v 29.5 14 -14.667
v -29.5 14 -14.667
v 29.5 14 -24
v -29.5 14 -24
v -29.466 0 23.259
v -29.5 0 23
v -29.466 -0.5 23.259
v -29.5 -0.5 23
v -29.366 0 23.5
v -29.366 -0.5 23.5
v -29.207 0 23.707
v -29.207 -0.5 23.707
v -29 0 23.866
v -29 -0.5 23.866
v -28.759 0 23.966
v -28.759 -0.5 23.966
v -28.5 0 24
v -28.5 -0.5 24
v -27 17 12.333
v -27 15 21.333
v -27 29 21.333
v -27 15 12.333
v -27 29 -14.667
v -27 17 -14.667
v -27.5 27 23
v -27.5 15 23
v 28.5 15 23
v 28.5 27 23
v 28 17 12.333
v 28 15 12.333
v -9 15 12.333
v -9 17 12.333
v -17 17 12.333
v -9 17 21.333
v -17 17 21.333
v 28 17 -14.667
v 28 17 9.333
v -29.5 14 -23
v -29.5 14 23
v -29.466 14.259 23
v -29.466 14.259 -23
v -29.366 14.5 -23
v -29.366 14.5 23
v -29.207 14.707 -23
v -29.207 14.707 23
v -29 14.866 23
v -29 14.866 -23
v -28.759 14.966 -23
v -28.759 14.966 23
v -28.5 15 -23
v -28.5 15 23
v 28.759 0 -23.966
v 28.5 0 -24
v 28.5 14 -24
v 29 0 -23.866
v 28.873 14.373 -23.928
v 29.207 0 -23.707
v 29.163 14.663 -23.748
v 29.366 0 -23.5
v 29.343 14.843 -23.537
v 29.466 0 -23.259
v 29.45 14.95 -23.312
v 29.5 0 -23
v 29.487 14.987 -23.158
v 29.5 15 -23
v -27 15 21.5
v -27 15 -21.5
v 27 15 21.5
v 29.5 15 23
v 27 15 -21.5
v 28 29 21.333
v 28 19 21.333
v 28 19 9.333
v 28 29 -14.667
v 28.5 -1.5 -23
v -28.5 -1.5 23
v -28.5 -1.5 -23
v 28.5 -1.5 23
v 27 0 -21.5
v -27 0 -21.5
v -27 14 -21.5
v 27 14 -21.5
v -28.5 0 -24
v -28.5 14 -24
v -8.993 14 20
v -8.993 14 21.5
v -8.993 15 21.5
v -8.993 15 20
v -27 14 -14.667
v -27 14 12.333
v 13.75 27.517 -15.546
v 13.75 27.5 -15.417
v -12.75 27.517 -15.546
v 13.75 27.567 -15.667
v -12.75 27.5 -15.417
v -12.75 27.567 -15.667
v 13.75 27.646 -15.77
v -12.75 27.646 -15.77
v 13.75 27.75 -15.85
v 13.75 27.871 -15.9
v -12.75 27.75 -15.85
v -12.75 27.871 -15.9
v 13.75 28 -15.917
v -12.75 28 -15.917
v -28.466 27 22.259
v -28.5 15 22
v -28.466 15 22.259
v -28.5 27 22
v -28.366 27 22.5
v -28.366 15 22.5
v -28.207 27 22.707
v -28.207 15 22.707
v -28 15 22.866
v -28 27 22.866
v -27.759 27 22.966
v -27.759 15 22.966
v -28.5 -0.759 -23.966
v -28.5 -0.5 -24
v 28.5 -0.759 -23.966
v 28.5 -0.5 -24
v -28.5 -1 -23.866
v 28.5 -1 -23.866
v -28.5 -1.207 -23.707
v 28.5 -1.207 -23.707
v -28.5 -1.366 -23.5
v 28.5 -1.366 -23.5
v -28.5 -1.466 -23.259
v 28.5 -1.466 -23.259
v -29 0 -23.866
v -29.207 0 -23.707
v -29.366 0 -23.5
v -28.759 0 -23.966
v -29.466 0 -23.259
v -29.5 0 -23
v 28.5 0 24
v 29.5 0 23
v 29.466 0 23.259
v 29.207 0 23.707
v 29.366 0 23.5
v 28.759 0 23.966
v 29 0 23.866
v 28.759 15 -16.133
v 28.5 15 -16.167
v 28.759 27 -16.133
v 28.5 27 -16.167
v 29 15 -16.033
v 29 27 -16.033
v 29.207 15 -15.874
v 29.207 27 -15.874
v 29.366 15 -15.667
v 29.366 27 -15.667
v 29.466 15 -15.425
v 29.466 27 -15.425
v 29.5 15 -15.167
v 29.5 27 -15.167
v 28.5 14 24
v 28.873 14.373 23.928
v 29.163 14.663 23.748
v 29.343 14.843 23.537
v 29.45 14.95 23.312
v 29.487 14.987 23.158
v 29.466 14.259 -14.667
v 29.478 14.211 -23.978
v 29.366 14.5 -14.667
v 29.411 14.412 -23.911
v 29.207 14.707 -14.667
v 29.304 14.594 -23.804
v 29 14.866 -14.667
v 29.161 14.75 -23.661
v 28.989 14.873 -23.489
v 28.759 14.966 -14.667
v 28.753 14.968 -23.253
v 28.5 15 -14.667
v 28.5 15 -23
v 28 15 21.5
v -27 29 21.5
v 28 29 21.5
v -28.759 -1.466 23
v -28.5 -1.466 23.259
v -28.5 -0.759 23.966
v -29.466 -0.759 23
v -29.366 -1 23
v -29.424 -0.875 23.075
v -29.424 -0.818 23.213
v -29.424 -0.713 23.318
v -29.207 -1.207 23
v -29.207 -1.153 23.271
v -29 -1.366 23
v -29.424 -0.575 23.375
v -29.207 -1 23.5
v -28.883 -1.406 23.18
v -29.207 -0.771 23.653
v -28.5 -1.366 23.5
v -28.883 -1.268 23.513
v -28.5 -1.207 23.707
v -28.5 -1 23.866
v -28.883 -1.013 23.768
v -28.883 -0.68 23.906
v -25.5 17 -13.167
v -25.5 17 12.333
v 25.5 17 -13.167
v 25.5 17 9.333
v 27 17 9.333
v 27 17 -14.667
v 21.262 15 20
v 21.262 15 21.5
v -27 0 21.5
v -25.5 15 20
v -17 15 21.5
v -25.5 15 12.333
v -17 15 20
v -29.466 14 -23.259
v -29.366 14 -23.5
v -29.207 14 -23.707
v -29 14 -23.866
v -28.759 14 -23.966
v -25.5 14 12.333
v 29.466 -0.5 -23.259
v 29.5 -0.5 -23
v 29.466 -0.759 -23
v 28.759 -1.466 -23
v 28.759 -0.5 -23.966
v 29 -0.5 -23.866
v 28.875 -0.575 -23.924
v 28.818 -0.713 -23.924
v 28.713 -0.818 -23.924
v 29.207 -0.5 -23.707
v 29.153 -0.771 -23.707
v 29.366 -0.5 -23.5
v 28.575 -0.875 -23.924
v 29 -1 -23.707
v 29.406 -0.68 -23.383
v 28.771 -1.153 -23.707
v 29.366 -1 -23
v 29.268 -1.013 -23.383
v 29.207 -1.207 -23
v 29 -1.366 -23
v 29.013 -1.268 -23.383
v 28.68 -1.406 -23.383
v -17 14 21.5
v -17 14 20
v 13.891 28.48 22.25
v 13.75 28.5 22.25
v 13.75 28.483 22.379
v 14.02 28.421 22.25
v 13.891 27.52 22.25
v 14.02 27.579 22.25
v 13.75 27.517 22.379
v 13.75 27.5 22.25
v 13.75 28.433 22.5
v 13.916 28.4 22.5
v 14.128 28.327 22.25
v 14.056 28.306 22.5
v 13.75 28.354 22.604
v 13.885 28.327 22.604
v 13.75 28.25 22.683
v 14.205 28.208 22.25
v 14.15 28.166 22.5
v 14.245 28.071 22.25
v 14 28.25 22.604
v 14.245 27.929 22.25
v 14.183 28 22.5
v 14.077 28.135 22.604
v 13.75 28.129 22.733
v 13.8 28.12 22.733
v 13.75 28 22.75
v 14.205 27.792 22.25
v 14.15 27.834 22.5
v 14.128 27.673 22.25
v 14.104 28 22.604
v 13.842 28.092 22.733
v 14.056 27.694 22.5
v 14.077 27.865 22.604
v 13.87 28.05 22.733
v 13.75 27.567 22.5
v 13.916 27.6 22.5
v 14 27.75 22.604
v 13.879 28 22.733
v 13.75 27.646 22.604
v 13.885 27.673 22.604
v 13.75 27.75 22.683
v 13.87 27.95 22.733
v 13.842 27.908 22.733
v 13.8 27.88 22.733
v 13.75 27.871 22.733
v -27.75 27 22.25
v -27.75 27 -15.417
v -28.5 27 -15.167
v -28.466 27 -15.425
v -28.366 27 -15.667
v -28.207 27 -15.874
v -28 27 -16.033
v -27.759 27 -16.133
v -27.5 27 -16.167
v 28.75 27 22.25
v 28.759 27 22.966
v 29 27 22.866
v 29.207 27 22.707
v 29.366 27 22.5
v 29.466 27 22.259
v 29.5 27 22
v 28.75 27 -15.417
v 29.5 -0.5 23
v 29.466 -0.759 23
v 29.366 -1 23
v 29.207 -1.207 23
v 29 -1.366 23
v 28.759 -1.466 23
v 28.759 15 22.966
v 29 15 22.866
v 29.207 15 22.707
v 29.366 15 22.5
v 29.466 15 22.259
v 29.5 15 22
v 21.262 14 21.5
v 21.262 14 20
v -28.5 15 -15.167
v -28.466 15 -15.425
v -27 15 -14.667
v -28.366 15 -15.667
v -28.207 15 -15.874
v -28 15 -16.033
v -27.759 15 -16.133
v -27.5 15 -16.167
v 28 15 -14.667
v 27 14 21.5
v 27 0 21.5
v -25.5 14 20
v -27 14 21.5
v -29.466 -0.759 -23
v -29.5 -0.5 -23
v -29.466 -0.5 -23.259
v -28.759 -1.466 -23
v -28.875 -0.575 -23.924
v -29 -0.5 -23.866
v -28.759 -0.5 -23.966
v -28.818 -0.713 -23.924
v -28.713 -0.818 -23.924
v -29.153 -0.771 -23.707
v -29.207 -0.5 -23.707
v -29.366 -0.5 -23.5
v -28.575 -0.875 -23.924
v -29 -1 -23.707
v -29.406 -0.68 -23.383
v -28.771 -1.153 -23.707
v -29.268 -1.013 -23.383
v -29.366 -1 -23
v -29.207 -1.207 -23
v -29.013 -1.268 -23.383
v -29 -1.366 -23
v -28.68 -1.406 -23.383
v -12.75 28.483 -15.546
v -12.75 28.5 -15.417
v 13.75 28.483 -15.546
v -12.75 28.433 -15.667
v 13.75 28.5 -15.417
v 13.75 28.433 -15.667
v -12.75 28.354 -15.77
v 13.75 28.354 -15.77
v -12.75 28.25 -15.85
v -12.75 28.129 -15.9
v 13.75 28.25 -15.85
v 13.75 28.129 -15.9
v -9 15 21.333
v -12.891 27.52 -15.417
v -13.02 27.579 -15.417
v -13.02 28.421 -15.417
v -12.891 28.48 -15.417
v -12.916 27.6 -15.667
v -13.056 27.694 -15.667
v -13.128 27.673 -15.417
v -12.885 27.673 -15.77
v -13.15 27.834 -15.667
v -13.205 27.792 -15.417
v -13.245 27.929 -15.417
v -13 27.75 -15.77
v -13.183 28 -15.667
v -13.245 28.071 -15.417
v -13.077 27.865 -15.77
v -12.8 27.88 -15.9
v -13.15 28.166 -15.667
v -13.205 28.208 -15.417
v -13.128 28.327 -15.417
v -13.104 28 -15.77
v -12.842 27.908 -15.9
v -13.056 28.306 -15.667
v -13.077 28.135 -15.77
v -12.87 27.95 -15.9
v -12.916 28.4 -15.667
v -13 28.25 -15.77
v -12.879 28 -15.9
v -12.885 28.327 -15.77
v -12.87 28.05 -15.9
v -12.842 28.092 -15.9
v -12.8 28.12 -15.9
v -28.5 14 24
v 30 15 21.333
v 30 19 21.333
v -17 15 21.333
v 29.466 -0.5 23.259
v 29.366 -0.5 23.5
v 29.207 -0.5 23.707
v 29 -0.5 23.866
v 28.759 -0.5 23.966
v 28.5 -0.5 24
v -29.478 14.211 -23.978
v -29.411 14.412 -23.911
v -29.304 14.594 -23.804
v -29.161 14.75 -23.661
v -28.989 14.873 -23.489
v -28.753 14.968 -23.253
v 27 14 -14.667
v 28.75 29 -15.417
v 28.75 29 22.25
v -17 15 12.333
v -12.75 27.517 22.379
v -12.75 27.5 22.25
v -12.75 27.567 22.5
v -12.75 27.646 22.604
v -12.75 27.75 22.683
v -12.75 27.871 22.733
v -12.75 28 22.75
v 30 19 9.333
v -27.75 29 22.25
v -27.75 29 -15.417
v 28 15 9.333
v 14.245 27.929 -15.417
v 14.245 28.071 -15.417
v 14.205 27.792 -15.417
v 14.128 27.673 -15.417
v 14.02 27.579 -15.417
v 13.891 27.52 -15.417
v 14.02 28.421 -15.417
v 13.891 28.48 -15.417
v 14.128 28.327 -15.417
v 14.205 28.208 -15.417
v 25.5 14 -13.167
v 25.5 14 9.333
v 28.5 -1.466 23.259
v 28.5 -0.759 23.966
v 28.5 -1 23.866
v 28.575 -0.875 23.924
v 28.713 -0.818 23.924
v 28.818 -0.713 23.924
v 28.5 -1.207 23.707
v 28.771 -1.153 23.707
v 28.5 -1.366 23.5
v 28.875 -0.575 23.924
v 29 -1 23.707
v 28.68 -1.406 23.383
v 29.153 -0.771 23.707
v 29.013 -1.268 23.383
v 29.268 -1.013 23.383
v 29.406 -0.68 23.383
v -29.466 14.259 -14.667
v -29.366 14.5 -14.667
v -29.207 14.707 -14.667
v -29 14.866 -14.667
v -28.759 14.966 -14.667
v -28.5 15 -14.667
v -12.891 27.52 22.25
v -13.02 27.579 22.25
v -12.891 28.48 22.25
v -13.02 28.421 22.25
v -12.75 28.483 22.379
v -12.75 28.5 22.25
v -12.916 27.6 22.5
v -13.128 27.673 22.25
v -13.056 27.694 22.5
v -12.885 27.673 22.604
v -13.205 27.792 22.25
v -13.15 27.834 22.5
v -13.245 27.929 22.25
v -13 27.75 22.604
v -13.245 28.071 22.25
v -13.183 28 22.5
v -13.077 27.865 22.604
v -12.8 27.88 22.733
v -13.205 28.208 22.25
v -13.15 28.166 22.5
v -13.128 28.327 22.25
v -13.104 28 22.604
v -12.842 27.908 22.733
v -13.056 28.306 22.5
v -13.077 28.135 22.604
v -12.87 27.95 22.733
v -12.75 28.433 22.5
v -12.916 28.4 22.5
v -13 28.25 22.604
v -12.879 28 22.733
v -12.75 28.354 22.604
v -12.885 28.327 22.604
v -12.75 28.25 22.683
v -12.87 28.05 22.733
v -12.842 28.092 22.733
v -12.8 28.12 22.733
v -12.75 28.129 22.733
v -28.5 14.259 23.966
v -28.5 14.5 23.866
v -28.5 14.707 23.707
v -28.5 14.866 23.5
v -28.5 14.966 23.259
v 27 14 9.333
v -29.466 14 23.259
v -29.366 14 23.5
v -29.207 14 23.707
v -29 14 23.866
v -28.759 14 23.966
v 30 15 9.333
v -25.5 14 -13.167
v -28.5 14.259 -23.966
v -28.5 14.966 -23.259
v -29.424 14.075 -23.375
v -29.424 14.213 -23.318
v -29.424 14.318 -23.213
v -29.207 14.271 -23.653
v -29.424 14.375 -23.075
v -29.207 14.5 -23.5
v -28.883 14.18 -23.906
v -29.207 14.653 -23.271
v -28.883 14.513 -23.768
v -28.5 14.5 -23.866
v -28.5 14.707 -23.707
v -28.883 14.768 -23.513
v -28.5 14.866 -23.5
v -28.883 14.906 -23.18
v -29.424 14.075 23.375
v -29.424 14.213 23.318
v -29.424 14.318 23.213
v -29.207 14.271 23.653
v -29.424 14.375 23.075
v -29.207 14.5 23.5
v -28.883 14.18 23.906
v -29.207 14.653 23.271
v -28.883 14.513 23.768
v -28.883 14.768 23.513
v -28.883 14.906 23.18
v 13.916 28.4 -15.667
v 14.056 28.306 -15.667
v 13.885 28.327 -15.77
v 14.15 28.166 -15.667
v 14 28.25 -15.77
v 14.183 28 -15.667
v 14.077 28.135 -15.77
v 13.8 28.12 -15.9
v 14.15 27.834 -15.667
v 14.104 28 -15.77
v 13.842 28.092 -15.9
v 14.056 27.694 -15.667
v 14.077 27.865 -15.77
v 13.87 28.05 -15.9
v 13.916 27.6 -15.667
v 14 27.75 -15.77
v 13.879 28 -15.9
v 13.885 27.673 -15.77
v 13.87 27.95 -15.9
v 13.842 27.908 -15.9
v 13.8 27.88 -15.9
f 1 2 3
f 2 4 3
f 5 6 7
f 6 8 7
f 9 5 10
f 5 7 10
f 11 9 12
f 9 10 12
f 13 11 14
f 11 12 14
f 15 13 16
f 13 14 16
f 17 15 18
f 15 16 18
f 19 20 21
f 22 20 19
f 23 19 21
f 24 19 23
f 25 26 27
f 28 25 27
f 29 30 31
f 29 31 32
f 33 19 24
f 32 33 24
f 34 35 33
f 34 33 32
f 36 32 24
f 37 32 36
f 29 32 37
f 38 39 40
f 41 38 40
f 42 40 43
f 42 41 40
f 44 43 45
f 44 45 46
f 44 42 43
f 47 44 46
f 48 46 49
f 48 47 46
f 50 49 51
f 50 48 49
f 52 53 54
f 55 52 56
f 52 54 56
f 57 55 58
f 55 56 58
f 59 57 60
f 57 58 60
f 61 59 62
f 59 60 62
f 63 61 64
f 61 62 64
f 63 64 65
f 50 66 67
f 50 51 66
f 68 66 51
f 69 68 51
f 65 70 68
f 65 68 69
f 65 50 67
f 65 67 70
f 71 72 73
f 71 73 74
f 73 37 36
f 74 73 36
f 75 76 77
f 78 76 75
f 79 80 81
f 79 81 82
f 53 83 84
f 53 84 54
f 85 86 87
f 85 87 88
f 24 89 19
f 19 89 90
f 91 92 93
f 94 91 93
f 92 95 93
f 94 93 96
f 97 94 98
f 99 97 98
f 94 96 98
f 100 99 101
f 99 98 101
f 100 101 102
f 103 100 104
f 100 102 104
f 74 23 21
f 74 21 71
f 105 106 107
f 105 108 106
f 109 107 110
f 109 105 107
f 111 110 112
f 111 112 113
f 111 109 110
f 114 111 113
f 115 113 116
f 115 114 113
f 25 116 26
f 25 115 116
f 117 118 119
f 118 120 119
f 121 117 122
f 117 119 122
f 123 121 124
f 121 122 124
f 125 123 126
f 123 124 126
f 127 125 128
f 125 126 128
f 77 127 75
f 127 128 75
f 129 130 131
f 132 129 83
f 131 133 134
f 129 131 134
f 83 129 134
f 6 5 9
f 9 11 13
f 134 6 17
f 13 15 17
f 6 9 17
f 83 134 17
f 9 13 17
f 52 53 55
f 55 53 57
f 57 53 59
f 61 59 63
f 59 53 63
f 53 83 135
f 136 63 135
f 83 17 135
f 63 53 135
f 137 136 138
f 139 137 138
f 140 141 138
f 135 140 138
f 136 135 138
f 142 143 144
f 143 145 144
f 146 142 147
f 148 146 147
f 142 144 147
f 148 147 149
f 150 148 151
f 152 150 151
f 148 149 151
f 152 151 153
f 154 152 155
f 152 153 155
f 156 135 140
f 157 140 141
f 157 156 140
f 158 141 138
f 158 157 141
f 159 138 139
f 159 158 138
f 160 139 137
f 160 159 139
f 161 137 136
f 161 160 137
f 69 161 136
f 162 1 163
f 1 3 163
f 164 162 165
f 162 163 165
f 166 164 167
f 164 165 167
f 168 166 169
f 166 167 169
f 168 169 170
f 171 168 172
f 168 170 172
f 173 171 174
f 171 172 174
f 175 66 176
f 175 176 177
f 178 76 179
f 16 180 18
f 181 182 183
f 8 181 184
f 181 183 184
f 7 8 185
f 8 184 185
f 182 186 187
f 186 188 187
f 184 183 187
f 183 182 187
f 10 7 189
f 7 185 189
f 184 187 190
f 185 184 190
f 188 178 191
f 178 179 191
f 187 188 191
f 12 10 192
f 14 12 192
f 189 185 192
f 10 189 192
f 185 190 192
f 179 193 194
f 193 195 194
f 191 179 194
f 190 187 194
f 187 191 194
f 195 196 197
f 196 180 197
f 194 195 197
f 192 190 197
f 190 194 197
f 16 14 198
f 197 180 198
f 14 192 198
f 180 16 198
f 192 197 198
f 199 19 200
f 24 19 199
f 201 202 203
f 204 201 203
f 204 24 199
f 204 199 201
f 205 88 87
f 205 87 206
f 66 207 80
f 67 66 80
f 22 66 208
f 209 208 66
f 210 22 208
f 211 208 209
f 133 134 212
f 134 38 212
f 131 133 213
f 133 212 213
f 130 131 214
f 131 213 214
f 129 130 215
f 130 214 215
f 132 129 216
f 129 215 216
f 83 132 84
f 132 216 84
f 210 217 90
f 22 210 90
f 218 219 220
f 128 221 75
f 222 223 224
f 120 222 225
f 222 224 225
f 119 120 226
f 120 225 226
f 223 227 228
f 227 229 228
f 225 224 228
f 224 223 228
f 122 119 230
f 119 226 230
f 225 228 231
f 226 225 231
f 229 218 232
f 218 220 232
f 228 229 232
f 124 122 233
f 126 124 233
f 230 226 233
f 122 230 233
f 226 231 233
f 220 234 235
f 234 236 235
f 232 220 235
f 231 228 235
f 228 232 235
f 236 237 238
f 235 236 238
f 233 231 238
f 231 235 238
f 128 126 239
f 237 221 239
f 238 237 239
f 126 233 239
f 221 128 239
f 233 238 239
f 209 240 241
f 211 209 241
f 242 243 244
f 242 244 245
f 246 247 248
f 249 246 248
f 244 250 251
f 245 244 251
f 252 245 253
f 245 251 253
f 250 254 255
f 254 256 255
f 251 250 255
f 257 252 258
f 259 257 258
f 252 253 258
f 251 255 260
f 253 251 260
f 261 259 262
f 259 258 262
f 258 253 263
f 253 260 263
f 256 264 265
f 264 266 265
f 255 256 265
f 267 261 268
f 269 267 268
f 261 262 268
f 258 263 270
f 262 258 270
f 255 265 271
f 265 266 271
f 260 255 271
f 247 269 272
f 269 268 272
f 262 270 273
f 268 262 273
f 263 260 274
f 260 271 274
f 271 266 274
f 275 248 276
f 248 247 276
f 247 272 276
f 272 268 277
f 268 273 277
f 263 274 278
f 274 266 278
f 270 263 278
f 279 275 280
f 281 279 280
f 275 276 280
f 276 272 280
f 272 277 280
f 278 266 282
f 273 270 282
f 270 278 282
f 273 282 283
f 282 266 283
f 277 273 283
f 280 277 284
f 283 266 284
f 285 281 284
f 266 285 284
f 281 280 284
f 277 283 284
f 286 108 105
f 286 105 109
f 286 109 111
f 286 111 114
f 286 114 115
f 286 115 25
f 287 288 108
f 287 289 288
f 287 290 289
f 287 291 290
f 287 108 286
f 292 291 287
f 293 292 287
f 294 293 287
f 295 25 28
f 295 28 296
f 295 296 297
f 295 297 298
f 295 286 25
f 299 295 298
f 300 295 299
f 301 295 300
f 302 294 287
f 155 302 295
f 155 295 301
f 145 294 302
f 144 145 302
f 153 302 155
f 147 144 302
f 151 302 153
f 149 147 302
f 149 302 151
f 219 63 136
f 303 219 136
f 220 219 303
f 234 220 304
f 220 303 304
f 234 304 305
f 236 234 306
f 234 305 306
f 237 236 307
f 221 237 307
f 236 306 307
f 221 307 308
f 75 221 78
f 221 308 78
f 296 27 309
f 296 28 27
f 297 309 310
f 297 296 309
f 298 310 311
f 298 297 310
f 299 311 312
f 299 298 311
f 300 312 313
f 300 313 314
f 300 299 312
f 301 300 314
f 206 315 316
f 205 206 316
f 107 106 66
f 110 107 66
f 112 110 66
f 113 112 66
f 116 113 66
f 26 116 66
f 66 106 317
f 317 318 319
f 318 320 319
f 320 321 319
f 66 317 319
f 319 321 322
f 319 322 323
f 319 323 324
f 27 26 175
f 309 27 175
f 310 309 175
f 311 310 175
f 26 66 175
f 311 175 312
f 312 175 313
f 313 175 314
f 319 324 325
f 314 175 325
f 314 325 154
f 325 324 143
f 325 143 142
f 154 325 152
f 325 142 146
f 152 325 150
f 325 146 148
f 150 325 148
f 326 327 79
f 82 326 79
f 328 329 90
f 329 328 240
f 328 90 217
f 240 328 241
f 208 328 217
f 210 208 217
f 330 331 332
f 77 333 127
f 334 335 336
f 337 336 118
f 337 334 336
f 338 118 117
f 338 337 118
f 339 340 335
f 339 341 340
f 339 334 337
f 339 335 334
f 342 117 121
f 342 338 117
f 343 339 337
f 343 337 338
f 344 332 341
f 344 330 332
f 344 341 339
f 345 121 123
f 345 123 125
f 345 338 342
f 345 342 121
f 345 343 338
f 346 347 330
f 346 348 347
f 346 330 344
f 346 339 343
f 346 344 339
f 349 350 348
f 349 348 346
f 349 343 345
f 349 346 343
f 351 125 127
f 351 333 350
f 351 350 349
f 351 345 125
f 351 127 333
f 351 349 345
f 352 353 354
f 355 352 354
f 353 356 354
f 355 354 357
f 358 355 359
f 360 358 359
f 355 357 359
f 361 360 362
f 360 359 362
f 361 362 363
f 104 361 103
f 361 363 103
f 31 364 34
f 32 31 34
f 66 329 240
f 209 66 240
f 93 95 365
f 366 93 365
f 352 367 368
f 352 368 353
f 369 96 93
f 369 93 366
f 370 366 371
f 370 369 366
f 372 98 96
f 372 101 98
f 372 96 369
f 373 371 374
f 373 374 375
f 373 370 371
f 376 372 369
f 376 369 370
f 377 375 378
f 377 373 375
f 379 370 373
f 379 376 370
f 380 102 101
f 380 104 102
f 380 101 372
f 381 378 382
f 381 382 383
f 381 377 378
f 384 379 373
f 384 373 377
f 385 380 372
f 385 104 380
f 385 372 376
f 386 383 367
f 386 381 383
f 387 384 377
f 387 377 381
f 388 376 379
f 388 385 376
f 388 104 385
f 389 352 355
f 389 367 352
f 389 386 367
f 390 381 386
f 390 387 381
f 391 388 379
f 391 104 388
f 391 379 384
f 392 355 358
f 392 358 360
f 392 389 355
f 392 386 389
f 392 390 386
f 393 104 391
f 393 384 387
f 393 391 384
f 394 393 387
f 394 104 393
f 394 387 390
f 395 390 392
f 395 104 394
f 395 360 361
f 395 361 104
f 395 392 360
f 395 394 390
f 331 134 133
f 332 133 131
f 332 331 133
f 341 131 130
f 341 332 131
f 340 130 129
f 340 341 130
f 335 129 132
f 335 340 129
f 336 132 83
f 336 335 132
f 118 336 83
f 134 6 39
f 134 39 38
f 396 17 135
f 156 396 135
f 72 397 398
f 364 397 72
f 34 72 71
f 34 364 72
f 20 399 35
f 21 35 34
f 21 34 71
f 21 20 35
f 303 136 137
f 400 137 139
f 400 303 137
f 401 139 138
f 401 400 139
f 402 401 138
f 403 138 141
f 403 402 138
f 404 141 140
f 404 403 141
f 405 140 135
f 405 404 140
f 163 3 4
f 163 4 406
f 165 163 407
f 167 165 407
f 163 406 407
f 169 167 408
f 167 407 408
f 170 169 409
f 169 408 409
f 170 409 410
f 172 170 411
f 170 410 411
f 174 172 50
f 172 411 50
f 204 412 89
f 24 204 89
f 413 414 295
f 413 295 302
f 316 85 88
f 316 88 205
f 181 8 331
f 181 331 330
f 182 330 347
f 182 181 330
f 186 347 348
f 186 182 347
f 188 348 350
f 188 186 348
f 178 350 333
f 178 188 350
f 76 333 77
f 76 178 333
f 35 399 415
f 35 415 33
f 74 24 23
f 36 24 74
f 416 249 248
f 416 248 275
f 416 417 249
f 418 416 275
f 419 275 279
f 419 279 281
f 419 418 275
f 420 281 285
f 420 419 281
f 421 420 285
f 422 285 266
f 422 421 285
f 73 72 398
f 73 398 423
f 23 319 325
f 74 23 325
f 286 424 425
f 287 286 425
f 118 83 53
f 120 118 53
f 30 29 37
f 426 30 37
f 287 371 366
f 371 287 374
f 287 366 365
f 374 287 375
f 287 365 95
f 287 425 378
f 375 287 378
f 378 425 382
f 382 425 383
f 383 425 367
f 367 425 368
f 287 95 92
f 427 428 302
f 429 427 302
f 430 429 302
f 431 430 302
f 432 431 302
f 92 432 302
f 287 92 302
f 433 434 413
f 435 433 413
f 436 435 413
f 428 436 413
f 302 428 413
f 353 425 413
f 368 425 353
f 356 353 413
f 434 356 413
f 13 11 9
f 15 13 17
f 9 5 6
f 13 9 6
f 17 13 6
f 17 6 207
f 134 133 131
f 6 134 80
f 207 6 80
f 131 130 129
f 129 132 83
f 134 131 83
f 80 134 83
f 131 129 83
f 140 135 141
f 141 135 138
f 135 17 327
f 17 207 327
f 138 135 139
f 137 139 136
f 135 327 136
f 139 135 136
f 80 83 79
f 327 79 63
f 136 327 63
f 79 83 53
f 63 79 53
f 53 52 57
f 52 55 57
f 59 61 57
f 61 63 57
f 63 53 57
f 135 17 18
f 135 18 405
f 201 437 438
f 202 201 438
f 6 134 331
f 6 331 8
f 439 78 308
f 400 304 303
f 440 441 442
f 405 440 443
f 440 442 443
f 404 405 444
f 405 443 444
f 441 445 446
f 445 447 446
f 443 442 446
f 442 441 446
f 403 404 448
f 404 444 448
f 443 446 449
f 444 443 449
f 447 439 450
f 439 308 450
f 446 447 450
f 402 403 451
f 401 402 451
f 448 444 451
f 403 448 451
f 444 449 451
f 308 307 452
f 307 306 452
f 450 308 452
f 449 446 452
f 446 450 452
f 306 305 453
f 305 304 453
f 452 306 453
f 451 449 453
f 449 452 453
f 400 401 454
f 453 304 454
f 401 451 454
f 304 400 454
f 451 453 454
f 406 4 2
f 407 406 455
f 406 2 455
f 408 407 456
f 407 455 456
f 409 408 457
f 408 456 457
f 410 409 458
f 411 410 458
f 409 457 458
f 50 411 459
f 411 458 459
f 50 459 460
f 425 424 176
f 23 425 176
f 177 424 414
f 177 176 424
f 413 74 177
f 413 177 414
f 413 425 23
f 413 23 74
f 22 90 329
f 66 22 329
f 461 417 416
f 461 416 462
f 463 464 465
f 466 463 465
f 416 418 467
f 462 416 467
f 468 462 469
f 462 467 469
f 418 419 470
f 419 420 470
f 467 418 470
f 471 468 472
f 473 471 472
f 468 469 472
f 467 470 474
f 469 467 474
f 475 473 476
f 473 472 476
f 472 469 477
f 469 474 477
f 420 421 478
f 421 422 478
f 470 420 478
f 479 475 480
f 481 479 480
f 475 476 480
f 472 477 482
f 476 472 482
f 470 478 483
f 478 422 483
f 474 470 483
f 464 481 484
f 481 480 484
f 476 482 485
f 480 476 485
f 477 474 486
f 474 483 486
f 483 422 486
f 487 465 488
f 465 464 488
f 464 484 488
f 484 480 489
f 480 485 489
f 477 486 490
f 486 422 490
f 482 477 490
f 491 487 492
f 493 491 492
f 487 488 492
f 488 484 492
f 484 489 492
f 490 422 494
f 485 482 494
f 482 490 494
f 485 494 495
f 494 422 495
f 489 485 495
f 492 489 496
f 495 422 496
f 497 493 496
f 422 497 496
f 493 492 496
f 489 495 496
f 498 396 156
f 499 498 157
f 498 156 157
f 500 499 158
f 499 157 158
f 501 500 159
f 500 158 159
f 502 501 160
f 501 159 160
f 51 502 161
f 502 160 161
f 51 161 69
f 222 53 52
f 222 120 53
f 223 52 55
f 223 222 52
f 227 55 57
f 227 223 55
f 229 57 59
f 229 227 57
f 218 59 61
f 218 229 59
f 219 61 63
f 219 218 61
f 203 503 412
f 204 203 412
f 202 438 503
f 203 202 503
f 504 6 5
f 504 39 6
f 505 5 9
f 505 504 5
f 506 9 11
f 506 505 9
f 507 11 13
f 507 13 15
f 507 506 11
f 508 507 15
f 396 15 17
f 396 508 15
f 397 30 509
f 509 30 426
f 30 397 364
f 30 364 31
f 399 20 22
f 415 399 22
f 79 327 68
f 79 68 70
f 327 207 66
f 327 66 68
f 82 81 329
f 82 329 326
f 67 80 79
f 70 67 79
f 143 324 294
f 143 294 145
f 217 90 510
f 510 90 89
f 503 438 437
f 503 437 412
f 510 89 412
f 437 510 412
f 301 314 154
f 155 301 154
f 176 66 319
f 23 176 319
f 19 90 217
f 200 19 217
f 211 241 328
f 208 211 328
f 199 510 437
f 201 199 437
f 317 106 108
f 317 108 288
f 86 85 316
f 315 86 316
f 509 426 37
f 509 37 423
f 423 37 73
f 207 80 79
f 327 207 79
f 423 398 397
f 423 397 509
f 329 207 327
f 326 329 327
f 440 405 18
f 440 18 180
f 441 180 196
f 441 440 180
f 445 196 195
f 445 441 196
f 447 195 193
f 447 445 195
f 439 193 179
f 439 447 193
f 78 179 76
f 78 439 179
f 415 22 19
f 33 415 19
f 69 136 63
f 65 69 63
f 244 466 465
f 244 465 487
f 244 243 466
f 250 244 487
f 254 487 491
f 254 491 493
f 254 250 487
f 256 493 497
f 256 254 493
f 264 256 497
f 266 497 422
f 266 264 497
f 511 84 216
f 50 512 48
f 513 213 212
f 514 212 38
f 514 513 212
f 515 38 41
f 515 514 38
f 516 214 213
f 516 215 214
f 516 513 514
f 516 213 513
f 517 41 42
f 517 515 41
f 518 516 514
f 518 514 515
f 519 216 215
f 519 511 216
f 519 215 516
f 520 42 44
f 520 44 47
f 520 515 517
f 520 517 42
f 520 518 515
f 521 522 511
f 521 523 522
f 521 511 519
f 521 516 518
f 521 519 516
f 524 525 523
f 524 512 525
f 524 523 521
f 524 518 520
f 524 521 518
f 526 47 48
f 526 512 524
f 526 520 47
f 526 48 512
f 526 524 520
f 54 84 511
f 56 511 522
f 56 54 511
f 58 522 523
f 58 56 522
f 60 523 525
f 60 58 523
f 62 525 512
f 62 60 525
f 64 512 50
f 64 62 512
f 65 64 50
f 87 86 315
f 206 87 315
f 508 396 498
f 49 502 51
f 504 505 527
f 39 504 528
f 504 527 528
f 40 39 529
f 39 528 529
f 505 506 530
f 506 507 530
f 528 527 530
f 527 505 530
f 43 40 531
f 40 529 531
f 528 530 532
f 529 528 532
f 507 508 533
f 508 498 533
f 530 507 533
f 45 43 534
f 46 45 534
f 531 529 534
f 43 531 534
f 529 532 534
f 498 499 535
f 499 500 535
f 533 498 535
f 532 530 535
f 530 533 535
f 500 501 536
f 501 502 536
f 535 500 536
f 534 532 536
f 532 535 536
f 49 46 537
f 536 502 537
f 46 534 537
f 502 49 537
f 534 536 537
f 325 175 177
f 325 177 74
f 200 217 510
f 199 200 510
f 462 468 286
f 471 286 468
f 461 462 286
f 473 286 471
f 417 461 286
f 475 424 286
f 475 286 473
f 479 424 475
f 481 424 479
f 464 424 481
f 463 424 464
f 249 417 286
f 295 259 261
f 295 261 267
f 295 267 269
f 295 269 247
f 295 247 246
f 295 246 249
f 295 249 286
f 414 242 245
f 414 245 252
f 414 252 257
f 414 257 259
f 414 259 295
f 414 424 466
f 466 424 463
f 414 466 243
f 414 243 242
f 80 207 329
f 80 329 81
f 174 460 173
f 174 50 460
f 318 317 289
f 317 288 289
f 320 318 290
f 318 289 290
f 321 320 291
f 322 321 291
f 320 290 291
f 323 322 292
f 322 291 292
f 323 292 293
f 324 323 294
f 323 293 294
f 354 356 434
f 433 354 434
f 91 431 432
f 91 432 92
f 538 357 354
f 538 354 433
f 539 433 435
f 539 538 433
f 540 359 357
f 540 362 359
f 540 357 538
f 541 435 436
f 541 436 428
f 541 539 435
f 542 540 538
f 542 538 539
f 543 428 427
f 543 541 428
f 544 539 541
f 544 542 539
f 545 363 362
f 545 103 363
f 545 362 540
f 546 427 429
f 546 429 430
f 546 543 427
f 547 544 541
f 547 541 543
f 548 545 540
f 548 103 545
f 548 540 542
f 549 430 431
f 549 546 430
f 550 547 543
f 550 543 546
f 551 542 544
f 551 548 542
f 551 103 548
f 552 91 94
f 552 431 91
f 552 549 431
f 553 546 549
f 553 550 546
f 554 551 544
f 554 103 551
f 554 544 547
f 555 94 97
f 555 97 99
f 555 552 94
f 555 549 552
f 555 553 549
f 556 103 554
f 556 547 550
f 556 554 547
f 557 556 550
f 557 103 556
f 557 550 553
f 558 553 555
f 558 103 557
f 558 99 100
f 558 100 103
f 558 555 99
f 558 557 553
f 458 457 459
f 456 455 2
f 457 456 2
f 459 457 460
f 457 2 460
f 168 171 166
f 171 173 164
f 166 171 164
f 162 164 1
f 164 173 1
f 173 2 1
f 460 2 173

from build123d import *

# Parameters (mm, degrees)
SKETCH2_W                        = 54
SKETCH2_H                        = 43
BOSS_EXTRUDE1_BATTERY_DEPTH      = 14
SKETCH4_W                        = 55
SKETCH4_H                        = 36
BOSS_EXTRUDE2_CIRCUIT_DEPTH      = 14
SKETCH11_W                       = 27
SKETCH11_H                       = 2
CUT_EXTRUDE2_CUTPINS_DEPTH       = 55
SKETCH12_W                       = 12
SKETCH12_H                       = 4
BOSS_EXTRUDE1_BATTERYCON_DEPTH   = 2
SKETCH8_W                        = 8
SKETCH8_H                        = 2
CUT_EXTRUDE3_SWITCHCONNGAP_DEPTH = 10
SKETCH13_W                       = 59
SKETCH13_H                       = 48
SKETCH13_W_2                     = 54
SKETCH13_H_2                     = 43
BOSS_EXTRUDE4_DEPTH              = 15
BOSS_EXTRUDE6_DEPTH              = 3
BOSS_EXTRUDE7_DEPTH              = 1
SKETCH14_6_W                     = 30.255010682
SKETCH14_6_H                     = 1.5
BOSS_EXTRUDE7_2_DEPTH            = 1
BOSS_EXTRUDE9_DEPTH              = 1
SKETCH15_W                       = 58
SKETCH15_H                       = 39.166666667
SKETCH15_W_2                     = 55
SKETCH15_H_2                     = 36.166666667
BOSS_EXTRUDE10_DEPTH             = 14
SKETCH16_W                       = 58
SKETCH16_H                       = 39.166666667
SKETCH16_W_2                     = 56.5
SKETCH16_H_2                     = 37.666666667
CUT_EXTRUDE_LIDCUT_DEPTH         = 2
BOSS_EXTRUDE11_DEPTH             = 0.5
FILLET5_R                        = 0.5
FILLET5_OF_MIRROR1_R             = 0.5
SKETCH18_W                       = 59
SKETCH18_H                       = 48
BOSS_EXTRUDE13_DEPTH             = 1.5
FILLET6_R                        = 1
FILLET7_R                        = 1
FILLET8_R                        = 1
FILLET9_R                        = 1


with BuildPart() as part:
    # Sketch2 → Boss-Extrude1-Battery (new body)
    with BuildSketch(Plane(origin=(0, 0, 0), x_dir=(1, 0, 0), z_dir=(0, 1, 0))):
        Rectangle(SKETCH2_W, SKETCH2_H)
    extrude(amount=BOSS_EXTRUDE1_BATTERY_DEPTH)


with BuildPart() as body_2:
    # Sketch4 → Boss-Extrude2-Circuit (new body)
    with BuildSketch(Plane(origin=(0, 15, 0), x_dir=(1, 0, 0), z_dir=(0, 1, 0))):
        with Locations((0.5, -3.333333333)):
            Rectangle(SKETCH4_W, SKETCH4_H)
    extrude(amount=BOSS_EXTRUDE2_CIRCUIT_DEPTH)

    # Sketch11 → Cut-Extrude2-CutPins (cut)
    with BuildSketch(Plane(origin=(28, 0, 0), x_dir=(0, 0, -1), z_dir=(1, 0, 0))):
        with Locations((1.166666667, 16)):
            Rectangle(SKETCH11_W, SKETCH11_H)
    extrude(amount=-CUT_EXTRUDE2_CUTPINS_DEPTH, mode=Mode.SUBTRACT)

    # Sketch12 → Boss-Extrude1-BatteryCon (add)
    with BuildSketch(Plane(origin=(28, 0, 0), x_dir=(0, 0, -1), z_dir=(1, 0, 0))):
        with Locations((-15.333333333, 17)):
            Rectangle(SKETCH12_W, SKETCH12_H)
    extrude(amount=BOSS_EXTRUDE1_BATTERYCON_DEPTH)

    # Sketch8 → Cut-Extrude3-SwitchConnGap (cut)
    with BuildSketch(Plane.XY.offset(21.333333333)):
        with Locations((-13, 16)):
            Rectangle(SKETCH8_W, SKETCH8_H)
    extrude(amount=-CUT_EXTRUDE3_SWITCHCONNGAP_DEPTH, mode=Mode.SUBTRACT)


with BuildPart() as body_3:
    # Sketch13 → Boss-Extrude4 (new body)
    with BuildSketch(Plane(origin=(0, 0, 0), x_dir=(1, 0, 0), z_dir=(0, 1, 0))):
        Rectangle(SKETCH13_W, SKETCH13_H)
        Rectangle(SKETCH13_W_2, SKETCH13_H_2, mode=Mode.SUBTRACT)
    extrude(amount=BOSS_EXTRUDE4_DEPTH)

    # Fillet6
    fillet6_edges = [body_3.edges().sort_by_distance(p)[0] for p in [
        (0, 15, 24),
        (0, 15, -24),
        (29.5, 7.5, -24),
        (29.5, 7.5, 24),
        (-29.5, 7.5, 24),
        (-29.5, 7.5, -24),
        (-29.5, 15, 0),
    ]]
    fillet(fillet6_edges, radius=FILLET6_R)


with BuildPart() as body_4:
    # Sketch14 → Boss-Extrude6 (new body)
    with BuildSketch(Plane(origin=(0, 14, 0), x_dir=(1, 0, 0), z_dir=(0, 1, 0))):
        Polygon((-25.5, -12.333333333), (-25.5, 13.166666667), (25.5, 13.166666667), (25.5, -9.333333333), (27, -9.333333333), (27, 14.666666667), (-27, 14.666666667), (-27, -12.333333333), align=None)
    extrude(amount=BOSS_EXTRUDE6_DEPTH)


with BuildPart() as body_5:
    # Sketch14<6> → Boss-Extrude7 (new body)
    with BuildSketch(Plane(origin=(0, 14, 0), x_dir=(1, 0, 0), z_dir=(0, 1, 0))):
        Polygon((-25.5, -20), (-25.5, -12.333333333), (-27, -12.333333333), (-27, -21.5), (-17, -21.5), (-17, -20), align=None)
    extrude(amount=BOSS_EXTRUDE7_DEPTH)


with BuildPart() as body_6:
    # Sketch14<6> → Boss-Extrude7 2 (new body)
    with BuildSketch(Plane(origin=(0, 14, 0), x_dir=(1, 0, 0), z_dir=(0, 1, 0))):
        with Locations((6.134582559, -20.75)):
            Rectangle(SKETCH14_6_W, SKETCH14_6_H)
    extrude(amount=BOSS_EXTRUDE7_2_DEPTH)


with BuildPart() as body_7:
    # Sketch14<7> → Boss-Extrude9 (new body)
    with BuildSketch(Plane(origin=(0, 14, 0), x_dir=(1, 0, 0), z_dir=(0, 1, 0))):
        Polygon((-29.5, 14.666666667), (-27, 14.666666667), (27, 14.666666667), (29.5, 14.666666667), (29.5, 24), (-29.5, 24), align=None)
    extrude(amount=BOSS_EXTRUDE9_DEPTH)

    # Fillet7
    fillet7_edges = [body_7.edges().sort_by_distance(p)[0] for p in [
        (29.5, 15, -19.333333333),
        (0, 15, -24),
        (-29.5, 15, -19.333333333),
    ]]
    fillet(fillet7_edges, radius=FILLET7_R - 0.0001)  # a hair under: the kernel refuses the full size


with BuildPart() as body_8:
    # Sketch15 → Boss-Extrude10 (new body)
    with BuildSketch(Plane(origin=(0, 15, 0), x_dir=(1, 0, 0), z_dir=(0, 1, 0))):
        with Locations((0.5, -3.416666666)):
            Rectangle(SKETCH15_W, SKETCH15_H)
        with Locations((0.5, -3.416666666)):
            Rectangle(SKETCH15_W_2, SKETCH15_H_2, mode=Mode.SUBTRACT)
    extrude(amount=BOSS_EXTRUDE10_DEPTH)

    # Sketch16 → Cut-Extrude-LidCut (cut)
    with BuildSketch(Plane(origin=(0, 29, 0), x_dir=(1, 0, 0), z_dir=(0, 1, 0))):
        with Locations((0.5, -3.416666666)):
            Rectangle(SKETCH16_W, SKETCH16_H)
        with Locations((0.5, -3.416666666)):
            Rectangle(SKETCH16_W_2, SKETCH16_H_2, mode=Mode.SUBTRACT)
    extrude(amount=-CUT_EXTRUDE_LIDCUT_DEPTH, mode=Mode.SUBTRACT)

    # Sketch17 → Boss-Extrude11 (add)
    with BuildSketch(Plane.XY.offset(22.25)):
        with BuildLine():
            Line((-12.75, 28.5), (13.75, 28.5))
            ThreePointArc((13.75, 28.5), (14.25, 28), (13.75, 27.5))
            Line((13.75, 27.5), (-12.75, 27.5))
            ThreePointArc((-12.75, 27.5), (-13.25, 28), (-12.75, 28.5))
        make_face()
    boss_extrude11 = extrude(amount=BOSS_EXTRUDE11_DEPTH)

    # Fillet5
    fillet5_edges = [body_8.edges().sort_by_distance(p)[0] for p in [
        (14.25, 28, 22.75),
        (-13.25, 28, 22.75),
        (0.5, 27.5, 22.75),
        (0.5, 28.5, 22.75),
    ]]
    fillet(fillet5_edges, radius=FILLET5_R - 0.0001)  # a hair under: the kernel refuses the full size

    # Mirror1: Boss-Extrude11 across plane
    add(boss_extrude11.mirror(Plane(origin=(0, 0, 3.416666667), x_dir=(1, 0, 0), z_dir=(0, 0, -1))))

    # Fillet5 of Mirror1
    fillet5_of_mirror1_edges = [body_8.edges().sort_by_distance(p)[0] for p in [
        (14.25, 28, -15.916666667),
        (-13.25, 28, -15.916666667),
        (0.5, 27.5, -15.916666667),
        (0.5, 28.5, -15.916666667),
    ]]
    fillet(fillet5_of_mirror1_edges, radius=FILLET5_OF_MIRROR1_R - 0.0001)  # a hair under: the kernel refuses the full size

    # Fillet8
    fillet8_edges = [body_8.edges().sort_by_distance(p)[0] for p in [
        (29.5, 21, -16.166666667),
        (29.5, 21, 23),
        (-28.5, 21, 23),
        (-28.5, 21, -16.166666667),
    ]]
    fillet(fillet8_edges, radius=FILLET8_R)


with BuildPart() as body_9:
    # Sketch18 → Boss-Extrude13 (new body)
    with BuildSketch(Plane.XZ):
        Rectangle(SKETCH18_W, SKETCH18_H)
    extrude(amount=BOSS_EXTRUDE13_DEPTH)

    # Fillet9
    fillet9_edges = [body_9.edges().sort_by_distance(p)[0] for p in [
        (29.5, -1.5, 0),
        (0, -1.5, 24),
        (-29.5, -1.5, 0),
        (-29.5, -0.75, 24),
        (29.5, -0.75, 24),
        (29.5, -0.75, -24),
        (-29.5, -0.75, -24),
        (0, -1.5, -24),
    ]]
    fillet(fillet9_edges, radius=FILLET9_R)


solid = Compound([part.part, body_2.part, body_3.part, body_4.part, body_5.part, body_6.part, body_7.part, body_8.part, body_9.part])
